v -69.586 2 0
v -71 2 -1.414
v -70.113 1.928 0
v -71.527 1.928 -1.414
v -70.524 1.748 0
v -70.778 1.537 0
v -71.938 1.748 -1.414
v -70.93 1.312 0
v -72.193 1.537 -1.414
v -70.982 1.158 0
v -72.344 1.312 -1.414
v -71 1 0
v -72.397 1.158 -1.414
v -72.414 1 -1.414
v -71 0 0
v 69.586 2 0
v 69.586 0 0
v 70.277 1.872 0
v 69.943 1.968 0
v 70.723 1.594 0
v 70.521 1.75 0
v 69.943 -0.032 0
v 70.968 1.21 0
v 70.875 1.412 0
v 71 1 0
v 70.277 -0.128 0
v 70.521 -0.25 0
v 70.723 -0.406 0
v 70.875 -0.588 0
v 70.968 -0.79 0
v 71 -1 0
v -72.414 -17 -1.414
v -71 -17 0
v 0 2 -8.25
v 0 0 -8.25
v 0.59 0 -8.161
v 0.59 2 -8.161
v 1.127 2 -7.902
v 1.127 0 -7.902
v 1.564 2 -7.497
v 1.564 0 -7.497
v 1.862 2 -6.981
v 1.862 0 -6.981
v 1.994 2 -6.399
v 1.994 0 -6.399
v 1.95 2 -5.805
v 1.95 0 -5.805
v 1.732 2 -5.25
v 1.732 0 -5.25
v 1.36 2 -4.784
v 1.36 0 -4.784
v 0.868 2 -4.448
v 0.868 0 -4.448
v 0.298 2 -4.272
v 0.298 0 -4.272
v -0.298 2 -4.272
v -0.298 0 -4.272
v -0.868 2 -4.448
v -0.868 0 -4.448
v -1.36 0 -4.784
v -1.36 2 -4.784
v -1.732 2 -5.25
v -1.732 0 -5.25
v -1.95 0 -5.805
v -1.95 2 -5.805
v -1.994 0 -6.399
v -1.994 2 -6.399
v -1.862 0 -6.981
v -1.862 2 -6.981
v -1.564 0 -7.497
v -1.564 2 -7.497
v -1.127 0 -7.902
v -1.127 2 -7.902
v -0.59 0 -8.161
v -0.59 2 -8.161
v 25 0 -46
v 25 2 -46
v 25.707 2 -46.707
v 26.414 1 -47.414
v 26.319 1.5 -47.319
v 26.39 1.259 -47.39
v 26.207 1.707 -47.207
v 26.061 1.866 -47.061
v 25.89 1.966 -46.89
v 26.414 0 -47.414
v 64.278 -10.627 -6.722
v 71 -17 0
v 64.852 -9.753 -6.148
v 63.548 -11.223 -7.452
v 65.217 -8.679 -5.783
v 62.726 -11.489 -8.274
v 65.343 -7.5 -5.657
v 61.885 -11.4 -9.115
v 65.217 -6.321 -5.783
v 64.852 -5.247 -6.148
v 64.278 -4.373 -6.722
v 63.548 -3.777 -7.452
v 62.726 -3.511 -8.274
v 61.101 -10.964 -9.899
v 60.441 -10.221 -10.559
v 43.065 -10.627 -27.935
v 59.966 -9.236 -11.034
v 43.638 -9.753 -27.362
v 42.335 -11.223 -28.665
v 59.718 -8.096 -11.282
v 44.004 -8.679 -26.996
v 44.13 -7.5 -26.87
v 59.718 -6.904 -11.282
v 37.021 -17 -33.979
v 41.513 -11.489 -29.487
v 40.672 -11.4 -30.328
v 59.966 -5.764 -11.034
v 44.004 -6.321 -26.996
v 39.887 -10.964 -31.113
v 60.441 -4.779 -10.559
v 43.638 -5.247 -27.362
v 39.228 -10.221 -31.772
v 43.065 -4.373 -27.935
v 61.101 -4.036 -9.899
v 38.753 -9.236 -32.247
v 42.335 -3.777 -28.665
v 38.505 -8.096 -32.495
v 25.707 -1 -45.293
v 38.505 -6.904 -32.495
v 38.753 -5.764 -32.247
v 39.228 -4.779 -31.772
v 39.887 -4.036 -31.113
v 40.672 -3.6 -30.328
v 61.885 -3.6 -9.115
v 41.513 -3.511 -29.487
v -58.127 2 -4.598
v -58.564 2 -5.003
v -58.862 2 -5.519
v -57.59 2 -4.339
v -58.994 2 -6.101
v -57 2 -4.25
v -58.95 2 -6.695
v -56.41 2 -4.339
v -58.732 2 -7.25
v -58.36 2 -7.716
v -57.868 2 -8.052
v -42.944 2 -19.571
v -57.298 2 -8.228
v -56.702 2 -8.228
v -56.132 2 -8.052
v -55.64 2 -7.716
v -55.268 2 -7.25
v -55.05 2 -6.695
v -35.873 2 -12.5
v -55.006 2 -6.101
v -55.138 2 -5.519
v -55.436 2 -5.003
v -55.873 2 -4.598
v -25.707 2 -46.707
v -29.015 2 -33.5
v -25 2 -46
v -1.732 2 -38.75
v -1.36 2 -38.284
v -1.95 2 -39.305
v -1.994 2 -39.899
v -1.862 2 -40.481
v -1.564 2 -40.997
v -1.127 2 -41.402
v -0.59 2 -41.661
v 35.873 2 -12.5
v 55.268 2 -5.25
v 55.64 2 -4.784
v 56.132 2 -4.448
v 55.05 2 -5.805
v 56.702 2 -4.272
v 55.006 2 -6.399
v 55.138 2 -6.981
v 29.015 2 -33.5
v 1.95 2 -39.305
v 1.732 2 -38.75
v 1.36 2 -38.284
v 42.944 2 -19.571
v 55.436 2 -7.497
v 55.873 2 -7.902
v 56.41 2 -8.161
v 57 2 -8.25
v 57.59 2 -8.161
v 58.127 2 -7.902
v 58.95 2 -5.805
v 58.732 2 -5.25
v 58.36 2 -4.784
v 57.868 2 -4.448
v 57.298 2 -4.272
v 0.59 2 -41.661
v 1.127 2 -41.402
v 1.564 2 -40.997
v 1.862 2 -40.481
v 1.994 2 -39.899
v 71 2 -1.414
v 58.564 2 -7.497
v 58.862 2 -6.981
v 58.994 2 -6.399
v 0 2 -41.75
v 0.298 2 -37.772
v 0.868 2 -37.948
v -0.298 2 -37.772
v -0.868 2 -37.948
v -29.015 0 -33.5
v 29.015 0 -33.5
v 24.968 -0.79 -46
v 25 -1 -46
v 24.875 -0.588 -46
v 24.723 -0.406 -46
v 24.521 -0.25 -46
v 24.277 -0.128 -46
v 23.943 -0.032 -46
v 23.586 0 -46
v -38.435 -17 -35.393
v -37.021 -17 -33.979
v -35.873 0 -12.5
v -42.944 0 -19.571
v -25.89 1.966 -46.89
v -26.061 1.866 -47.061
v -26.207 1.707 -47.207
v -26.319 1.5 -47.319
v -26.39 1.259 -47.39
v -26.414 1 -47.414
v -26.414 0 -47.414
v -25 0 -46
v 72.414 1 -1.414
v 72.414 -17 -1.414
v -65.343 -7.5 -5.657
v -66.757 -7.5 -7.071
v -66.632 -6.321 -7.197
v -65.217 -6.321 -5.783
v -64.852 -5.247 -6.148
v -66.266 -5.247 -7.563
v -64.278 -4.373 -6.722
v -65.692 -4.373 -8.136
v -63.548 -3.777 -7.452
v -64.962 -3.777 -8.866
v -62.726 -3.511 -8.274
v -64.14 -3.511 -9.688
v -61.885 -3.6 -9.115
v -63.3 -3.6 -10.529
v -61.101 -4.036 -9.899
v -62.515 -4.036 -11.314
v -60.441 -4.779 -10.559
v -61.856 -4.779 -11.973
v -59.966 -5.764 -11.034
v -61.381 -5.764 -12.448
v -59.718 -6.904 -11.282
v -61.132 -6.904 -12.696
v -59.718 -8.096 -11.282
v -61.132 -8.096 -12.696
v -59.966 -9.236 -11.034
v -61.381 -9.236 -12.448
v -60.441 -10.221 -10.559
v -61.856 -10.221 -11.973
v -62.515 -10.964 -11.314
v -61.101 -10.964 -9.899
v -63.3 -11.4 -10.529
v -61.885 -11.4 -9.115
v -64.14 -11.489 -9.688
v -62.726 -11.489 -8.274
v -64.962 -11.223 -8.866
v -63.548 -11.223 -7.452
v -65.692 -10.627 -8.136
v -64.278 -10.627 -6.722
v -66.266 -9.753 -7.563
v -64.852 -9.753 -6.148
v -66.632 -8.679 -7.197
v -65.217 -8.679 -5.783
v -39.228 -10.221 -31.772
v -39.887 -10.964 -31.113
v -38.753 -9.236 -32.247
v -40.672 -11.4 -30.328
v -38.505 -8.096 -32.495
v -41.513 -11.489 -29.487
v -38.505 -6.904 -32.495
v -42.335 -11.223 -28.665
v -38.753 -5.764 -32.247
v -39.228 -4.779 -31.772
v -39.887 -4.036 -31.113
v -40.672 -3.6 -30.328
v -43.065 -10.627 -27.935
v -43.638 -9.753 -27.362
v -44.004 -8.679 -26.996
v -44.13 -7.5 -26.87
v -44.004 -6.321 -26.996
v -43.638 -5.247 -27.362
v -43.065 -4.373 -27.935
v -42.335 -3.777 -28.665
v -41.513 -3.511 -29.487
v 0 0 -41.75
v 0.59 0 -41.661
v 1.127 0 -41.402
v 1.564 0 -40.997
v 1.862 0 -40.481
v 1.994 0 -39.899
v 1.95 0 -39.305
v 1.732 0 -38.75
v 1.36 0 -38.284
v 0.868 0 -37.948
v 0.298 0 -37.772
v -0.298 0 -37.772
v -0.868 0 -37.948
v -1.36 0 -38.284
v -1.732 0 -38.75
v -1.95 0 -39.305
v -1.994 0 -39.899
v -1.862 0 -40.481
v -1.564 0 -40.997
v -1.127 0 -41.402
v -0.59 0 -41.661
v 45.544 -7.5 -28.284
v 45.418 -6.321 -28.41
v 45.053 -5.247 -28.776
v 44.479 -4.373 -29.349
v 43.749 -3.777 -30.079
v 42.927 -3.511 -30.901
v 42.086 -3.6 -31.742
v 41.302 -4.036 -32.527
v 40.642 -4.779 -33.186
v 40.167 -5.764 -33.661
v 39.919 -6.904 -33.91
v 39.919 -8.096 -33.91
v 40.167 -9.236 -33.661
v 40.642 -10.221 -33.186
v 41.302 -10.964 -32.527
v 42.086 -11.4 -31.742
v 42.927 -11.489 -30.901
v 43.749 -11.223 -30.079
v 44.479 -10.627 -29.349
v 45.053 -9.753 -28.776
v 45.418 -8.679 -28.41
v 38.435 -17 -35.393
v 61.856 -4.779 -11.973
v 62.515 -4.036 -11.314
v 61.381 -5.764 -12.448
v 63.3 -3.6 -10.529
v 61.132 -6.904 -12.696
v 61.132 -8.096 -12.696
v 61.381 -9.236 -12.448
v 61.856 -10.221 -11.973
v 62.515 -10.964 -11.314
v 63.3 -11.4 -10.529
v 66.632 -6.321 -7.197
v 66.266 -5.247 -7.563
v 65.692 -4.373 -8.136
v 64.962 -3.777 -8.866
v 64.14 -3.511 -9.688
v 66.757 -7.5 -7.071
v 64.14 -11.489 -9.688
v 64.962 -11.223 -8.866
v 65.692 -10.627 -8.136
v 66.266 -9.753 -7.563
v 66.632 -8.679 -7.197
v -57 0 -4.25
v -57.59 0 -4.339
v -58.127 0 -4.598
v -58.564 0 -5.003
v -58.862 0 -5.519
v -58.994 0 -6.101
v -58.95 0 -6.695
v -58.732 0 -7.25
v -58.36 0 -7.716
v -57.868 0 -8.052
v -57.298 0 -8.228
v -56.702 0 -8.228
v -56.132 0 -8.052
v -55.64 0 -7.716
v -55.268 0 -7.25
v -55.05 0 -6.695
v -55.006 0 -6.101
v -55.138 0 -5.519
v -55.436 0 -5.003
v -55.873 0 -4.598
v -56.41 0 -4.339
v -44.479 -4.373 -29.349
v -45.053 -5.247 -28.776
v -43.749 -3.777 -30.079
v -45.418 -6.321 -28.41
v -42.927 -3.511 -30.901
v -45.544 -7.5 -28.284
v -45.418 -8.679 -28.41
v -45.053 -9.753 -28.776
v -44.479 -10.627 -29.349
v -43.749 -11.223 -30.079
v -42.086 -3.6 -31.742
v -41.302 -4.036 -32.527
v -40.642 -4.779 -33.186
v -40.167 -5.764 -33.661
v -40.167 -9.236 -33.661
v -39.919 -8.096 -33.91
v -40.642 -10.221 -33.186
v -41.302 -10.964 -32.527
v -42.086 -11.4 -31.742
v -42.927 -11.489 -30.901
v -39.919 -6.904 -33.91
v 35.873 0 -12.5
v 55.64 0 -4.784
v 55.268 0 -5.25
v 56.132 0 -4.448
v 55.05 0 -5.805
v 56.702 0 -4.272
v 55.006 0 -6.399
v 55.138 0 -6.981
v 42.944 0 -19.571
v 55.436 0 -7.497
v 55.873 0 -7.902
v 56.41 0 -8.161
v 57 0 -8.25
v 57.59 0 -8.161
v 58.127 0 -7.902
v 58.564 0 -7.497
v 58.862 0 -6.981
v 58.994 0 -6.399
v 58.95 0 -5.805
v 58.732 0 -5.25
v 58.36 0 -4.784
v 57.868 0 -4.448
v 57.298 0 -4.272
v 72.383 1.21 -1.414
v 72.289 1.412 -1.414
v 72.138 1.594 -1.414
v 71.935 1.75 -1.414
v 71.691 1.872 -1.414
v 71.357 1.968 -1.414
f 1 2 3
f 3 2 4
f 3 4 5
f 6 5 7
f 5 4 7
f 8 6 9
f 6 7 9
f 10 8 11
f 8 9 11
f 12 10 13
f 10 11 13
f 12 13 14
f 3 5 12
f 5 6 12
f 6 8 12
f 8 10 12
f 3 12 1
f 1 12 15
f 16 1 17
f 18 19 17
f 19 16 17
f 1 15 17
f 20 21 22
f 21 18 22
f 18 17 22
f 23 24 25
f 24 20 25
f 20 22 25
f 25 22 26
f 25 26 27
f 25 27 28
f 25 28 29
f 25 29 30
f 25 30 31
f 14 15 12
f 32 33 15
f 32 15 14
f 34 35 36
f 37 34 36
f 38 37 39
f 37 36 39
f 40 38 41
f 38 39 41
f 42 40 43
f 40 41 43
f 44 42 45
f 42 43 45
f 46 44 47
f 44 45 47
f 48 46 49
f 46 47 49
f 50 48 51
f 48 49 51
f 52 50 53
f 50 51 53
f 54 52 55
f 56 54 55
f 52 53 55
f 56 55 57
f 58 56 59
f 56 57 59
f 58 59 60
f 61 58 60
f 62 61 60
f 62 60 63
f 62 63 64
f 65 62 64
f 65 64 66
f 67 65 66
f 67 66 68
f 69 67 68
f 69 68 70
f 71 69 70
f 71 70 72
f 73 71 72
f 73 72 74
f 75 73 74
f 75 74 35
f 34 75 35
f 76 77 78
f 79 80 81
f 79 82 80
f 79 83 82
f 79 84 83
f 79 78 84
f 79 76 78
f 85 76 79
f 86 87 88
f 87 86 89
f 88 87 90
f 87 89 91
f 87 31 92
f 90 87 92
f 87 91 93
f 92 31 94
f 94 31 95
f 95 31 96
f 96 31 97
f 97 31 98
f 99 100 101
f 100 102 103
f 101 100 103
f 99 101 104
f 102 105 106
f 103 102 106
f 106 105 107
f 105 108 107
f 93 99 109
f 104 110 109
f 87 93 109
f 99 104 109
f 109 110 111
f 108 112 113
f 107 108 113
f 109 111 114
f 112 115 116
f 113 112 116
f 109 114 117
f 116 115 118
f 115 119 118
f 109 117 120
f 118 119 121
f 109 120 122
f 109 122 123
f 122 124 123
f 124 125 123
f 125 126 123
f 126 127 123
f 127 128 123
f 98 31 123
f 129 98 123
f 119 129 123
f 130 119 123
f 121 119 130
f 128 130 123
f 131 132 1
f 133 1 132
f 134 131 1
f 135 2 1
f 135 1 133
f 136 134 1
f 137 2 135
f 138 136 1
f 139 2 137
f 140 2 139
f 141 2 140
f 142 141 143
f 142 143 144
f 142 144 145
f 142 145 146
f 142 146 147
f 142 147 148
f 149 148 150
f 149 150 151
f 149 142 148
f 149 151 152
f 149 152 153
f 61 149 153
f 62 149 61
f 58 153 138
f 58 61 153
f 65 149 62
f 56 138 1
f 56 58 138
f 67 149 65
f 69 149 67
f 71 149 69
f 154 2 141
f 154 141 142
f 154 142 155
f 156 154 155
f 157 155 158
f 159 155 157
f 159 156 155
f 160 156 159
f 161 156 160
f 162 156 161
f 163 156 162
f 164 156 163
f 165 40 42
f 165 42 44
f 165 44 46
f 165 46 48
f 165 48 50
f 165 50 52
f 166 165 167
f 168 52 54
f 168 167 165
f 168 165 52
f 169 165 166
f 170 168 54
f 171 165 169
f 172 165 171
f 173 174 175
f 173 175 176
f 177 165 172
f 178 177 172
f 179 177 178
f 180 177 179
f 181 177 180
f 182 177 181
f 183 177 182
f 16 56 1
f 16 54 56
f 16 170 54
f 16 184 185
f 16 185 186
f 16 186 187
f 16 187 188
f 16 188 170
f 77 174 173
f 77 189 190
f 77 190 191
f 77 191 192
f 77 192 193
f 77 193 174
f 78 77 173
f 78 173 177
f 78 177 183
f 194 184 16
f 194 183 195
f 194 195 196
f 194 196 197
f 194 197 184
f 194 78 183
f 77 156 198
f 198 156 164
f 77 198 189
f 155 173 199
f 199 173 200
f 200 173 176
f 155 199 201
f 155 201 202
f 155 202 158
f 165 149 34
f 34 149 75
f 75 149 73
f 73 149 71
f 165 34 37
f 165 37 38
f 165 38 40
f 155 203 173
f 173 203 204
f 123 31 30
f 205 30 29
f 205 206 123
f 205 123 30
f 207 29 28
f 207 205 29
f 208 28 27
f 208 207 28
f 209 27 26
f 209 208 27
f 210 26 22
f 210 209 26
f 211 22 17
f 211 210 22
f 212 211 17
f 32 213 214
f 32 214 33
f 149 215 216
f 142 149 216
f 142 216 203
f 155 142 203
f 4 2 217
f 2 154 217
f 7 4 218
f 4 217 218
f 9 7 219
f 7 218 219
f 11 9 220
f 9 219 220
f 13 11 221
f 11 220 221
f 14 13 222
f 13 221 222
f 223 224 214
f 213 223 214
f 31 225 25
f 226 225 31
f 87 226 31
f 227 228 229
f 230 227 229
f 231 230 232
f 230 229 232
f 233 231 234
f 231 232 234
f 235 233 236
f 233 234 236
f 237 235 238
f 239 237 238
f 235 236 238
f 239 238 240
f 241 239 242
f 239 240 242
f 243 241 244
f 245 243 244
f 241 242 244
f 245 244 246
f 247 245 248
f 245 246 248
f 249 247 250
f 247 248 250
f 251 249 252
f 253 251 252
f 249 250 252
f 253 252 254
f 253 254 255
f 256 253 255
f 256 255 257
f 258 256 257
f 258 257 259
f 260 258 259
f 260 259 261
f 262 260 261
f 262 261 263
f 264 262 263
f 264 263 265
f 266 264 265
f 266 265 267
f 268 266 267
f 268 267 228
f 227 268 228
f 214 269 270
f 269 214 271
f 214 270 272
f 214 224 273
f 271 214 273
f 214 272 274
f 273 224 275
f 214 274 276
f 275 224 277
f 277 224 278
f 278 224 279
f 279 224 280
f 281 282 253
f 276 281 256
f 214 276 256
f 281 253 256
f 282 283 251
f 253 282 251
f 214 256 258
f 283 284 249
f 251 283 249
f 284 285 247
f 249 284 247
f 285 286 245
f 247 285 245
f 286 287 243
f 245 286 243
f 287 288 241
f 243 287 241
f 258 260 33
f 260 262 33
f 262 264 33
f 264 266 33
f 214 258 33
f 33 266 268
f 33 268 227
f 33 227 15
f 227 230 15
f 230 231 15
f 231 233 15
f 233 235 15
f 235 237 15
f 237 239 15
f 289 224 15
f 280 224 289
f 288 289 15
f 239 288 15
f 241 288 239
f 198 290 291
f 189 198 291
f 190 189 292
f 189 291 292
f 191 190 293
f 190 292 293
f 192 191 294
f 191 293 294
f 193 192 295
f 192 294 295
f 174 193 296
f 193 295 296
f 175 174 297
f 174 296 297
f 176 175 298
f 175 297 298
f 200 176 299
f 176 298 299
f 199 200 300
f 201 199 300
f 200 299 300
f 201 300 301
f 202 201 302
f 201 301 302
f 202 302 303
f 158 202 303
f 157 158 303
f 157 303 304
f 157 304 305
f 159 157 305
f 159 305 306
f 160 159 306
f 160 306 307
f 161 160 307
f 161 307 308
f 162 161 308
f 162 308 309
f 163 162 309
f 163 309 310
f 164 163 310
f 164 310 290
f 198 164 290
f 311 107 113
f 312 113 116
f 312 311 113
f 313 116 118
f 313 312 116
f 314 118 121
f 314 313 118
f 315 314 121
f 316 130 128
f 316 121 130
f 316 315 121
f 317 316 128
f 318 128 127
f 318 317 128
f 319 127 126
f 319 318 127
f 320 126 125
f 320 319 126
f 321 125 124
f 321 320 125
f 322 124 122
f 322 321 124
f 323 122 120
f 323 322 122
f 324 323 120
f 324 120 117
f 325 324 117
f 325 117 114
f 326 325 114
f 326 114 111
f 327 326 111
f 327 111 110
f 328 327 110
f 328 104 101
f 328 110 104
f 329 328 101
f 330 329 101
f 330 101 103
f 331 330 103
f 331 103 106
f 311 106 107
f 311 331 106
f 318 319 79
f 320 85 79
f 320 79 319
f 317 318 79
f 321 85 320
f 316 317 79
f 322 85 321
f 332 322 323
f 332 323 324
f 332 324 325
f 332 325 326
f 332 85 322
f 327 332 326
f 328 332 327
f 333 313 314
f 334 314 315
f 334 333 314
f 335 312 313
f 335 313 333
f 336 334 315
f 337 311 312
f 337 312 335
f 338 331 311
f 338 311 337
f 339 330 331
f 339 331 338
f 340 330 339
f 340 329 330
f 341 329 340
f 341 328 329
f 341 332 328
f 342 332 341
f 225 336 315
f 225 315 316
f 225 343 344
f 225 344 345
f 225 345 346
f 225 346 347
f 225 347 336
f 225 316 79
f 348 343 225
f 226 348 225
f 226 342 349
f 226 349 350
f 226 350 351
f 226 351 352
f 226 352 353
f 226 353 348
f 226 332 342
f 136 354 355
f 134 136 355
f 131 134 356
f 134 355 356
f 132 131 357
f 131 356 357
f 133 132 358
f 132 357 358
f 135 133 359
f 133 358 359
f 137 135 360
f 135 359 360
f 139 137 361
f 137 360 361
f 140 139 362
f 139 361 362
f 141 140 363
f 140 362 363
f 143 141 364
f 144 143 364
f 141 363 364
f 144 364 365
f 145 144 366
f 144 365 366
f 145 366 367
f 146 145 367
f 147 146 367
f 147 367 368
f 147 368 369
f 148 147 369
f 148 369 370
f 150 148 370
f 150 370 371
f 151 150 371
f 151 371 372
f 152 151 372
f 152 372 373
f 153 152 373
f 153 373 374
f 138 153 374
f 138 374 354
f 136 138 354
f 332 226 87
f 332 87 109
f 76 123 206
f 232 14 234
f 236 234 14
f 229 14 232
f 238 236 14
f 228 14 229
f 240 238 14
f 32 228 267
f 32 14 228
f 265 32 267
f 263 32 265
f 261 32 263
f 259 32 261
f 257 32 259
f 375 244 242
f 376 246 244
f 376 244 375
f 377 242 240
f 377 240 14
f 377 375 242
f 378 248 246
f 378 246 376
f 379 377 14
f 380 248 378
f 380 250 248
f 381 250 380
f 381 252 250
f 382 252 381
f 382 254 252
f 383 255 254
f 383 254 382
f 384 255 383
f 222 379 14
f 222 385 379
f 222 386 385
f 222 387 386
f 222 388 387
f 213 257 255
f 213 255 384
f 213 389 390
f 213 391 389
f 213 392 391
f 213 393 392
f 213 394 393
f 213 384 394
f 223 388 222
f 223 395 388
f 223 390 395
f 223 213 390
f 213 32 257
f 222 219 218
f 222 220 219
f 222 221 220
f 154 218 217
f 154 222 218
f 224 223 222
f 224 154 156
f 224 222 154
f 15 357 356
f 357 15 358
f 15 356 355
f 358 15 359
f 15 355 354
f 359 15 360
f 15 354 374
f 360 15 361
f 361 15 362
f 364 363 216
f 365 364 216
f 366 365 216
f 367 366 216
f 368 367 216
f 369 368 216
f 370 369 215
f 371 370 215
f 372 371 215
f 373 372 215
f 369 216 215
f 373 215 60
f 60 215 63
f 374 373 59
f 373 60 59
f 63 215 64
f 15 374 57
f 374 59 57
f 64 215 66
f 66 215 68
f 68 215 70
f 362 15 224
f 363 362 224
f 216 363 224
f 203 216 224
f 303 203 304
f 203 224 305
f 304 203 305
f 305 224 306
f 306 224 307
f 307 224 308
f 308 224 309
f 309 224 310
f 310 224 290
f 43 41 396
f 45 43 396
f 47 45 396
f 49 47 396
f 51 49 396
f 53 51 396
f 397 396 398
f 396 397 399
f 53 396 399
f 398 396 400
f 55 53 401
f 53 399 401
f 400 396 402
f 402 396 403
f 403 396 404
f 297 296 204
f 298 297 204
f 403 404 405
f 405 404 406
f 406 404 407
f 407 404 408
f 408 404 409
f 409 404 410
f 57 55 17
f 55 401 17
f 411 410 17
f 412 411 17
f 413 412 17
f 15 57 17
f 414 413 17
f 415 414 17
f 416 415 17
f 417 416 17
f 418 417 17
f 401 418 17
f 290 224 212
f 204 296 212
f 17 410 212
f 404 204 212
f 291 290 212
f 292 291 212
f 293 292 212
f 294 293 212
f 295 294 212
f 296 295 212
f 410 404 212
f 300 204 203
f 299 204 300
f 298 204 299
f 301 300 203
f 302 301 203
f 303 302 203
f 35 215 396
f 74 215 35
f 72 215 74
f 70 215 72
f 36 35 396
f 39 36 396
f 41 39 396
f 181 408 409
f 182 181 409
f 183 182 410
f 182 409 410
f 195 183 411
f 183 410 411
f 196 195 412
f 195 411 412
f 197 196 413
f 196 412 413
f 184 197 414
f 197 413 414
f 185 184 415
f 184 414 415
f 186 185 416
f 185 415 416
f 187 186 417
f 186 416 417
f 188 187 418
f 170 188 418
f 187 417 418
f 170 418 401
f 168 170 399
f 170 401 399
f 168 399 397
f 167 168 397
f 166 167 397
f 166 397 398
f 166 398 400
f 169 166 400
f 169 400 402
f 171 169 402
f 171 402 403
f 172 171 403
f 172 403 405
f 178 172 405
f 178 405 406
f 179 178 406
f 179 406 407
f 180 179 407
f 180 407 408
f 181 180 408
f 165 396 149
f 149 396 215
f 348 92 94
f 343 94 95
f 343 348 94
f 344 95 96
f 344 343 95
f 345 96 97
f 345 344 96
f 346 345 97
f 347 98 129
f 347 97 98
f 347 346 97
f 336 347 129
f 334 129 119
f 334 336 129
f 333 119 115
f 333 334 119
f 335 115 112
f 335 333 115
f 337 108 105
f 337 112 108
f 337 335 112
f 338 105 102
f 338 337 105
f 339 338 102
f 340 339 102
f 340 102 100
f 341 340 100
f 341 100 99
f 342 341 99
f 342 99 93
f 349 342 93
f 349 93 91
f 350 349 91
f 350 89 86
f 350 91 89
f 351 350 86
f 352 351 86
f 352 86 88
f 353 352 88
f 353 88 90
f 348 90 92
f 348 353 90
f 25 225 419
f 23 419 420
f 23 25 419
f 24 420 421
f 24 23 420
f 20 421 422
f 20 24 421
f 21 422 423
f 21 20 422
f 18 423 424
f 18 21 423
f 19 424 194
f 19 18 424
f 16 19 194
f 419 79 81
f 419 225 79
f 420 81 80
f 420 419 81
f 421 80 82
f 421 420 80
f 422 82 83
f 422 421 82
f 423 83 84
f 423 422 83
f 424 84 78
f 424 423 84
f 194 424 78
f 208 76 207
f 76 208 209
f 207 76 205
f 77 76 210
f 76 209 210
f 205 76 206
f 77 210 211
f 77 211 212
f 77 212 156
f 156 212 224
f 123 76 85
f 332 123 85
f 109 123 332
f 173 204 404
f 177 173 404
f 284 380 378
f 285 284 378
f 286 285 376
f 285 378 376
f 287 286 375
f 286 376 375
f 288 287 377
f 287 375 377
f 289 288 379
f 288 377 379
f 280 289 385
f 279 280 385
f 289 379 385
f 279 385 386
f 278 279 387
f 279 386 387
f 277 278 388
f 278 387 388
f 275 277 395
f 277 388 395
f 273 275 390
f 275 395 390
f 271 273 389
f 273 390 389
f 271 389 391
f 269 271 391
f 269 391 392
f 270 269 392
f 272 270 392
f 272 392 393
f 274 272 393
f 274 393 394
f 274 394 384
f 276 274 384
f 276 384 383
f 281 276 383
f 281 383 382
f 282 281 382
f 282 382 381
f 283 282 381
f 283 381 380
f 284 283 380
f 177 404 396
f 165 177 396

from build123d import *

# Parameters (mm, degrees)
BOSS_EXTRUDE1_DEPTH             = 2
BOSS_EXTRUDE2_DEPTH             = 17
BOSS_EXTRUDE2_DIRECTION_2_REACH = 86.623
SKETCH7_R                       = 4
CUT_EXTRUDE4_DEPTH              = 117.637747494
FILLET1_R                       = 1
CUT_EXTRUDE1_DEPTH              = 115.868304979
CUT_EXTRUDE2_DEPTH              = 89.209557156
SKETCH5_R                       = 2
CUT_EXTRUDE3_DEPTH              = 89.209557156


with BuildPart() as part:
    # Sketch1 → Boss-Extrude1 (new body)
    with BuildSketch(Plane(origin=(0, 0, 0), x_dir=(1, 0, 0), z_dir=(0, 1, 0))):
        Polygon((25, 46), (-25, 46), (-71, 0), (71, 0), align=None)
    extrude(amount=BOSS_EXTRUDE1_DEPTH)

    # Sketch2 → Boss-Extrude2 (add)
    with BuildSketch(Plane(origin=(0, 0, 0), x_dir=(-1, 0, 0), z_dir=(0, -1, 0))):
        Polygon((25, 46), (71, 0), (72.414213562, 1.414213562), (26.414213562, 47.414213562), align=None)
        Polygon((-26.414213562, 47.414213562), (-72.414213562, 1.414213562), (-71, 0), (-25, 46), align=None)
    extrude(amount=BOSS_EXTRUDE2_DEPTH)

    # Boss-Extrude2 direction 2: up to this face of the body (flat: up to its plane)
    boss_extrude2_direction_2_end = Plane(part.part.faces().sort_by_distance((0, 2, -19.326388889))[0])
    # Sketch2 → Boss-Extrude2 direction 2 (add, up to the picked face)
    with BuildSketch(Plane(origin=(0, 0, 0), x_dir=(-1, 0, 0), z_dir=(0, -1, 0)), mode=Mode.PRIVATE) as boss_extrude2_direction_2_sk1:
        Polygon((25, 46), (71, 0), (72.414213562, 1.414213562), (26.414213562, 47.414213562), align=None)
    boss_extrude2_direction_2_tool1 = split(extrude(boss_extrude2_direction_2_sk1.sketch, amount=-BOSS_EXTRUDE2_DIRECTION_2_REACH, mode=Mode.PRIVATE), bisect_by=boss_extrude2_direction_2_end, keep=Keep.BOTH, mode=Mode.PRIVATE)
    # Sketch2 → Boss-Extrude2 direction 2 (add, up to the picked face)
    with BuildSketch(Plane(origin=(0, 0, 0), x_dir=(-1, 0, 0), z_dir=(0, -1, 0)), mode=Mode.PRIVATE) as boss_extrude2_direction_2_sk2:
        Polygon((-26.414213562, 47.414213562), (-72.414213562, 1.414213562), (-71, 0), (-25, 46), align=None)
    boss_extrude2_direction_2_tool2 = split(extrude(boss_extrude2_direction_2_sk2.sketch, amount=-BOSS_EXTRUDE2_DIRECTION_2_REACH, mode=Mode.PRIVATE), bisect_by=boss_extrude2_direction_2_end, keep=Keep.BOTH, mode=Mode.PRIVATE)
    add(boss_extrude2_direction_2_tool1.solids().sort_by(Axis((-48.707107, 0, -23.707107), (0, 1, 0)))[0])
    add(boss_extrude2_direction_2_tool2.solids().sort_by(Axis((48.707107, 0, -23.707107), (0, 1, 0)))[0])

    # Sketch7 → Cut-Extrude4 (cut, through all)
    with BuildSketch(Plane(origin=(-36.914213562, 0, -36.914213562), x_dir=(-0.7071067811865512, 0, 0.7071067811865438), z_dir=(-0.7071067811865438, 0, -0.7071067811865512))):
        with Locations((38.204581464, -7.5)):
            Circle(SKETCH7_R)
        with Locations((8.204581464, -7.5)):
            Circle(SKETCH7_R)
    cut_extrude4 = extrude(amount=-CUT_EXTRUDE4_DEPTH, mode=Mode.SUBTRACT)

    # Fillet1
    fillet1_edges = [part.edges().sort_by_distance(p)[0] for p in [
        (-49.414213562, 2, -24.414213562),
        (-71.707106781, 2, -0.707106781),
        (71.707106781, 2, -0.707106781),
        (49.414213562, 2, -24.414213562),
        (48, 0, -23),
    ]]
    fillet(fillet1_edges, radius=FILLET1_R)

    # Sketch3 → Cut-Extrude1 (cut, through all)
    with BuildSketch(Plane(origin=(-35.5, 0, -35.5), x_dir=(0.7071067811865511, 0, -0.707106781186544), z_dir=(0.707106781186544, 0, 0.7071067811865511))):
        Polygon((14.849242405, 0), (-2.150757595, -17), (14.849242405, -17), align=None)
    cut_extrude1 = extrude(amount=-CUT_EXTRUDE1_DEPTH, mode=Mode.SUBTRACT)

    # Sketch4 → Cut-Extrude2 (cut, through all)
    with BuildSketch(Plane(origin=(0, 0, 0), x_dir=(-1, 0, 0), z_dir=(0, -1, 0))):
        Polygon((42.943650814, 19.571067812), (29.014718626, 33.5), (0, 33.5), (0, 12.5), (35.872583002, 12.5), align=None)
        Polygon((0, 12.5), (0, 33.5), (-29.014718626, 33.5), (-42.943650814, 19.571067812), (-35.872583002, 12.5), align=None)
    extrude(amount=-CUT_EXTRUDE2_DEPTH, mode=Mode.SUBTRACT)

    # Mirror1: Cut-Extrude4, Cut-Extrude1 across plane
    add(cut_extrude4.mirror(Plane.ZY), mode=Mode.SUBTRACT)
    add(cut_extrude1.mirror(Plane.ZY), mode=Mode.SUBTRACT)

    # Sketch5 → Cut-Extrude3 (cut, through all)
    with BuildSketch(Plane(origin=(0, 0, 0), x_dir=(-1, 0, 0), z_dir=(0, -1, 0))):
        with Locations(Location((0, 6.25, 0), (0, 0, 90))):
            Circle(SKETCH5_R)
        with Locations(Location((0, 39.75, 0), (0, 0, 90))):
            Circle(SKETCH5_R)
        with Locations(Location((-57, 6.25, 0), (0, 0, 90))):
            Circle(SKETCH5_R)
        with Locations(Location((57, 6.25, 0), (0, 0, 270))):
            Circle(SKETCH5_R)
    extrude(amount=-CUT_EXTRUDE3_DEPTH, mode=Mode.SUBTRACT)


solid = part.part
